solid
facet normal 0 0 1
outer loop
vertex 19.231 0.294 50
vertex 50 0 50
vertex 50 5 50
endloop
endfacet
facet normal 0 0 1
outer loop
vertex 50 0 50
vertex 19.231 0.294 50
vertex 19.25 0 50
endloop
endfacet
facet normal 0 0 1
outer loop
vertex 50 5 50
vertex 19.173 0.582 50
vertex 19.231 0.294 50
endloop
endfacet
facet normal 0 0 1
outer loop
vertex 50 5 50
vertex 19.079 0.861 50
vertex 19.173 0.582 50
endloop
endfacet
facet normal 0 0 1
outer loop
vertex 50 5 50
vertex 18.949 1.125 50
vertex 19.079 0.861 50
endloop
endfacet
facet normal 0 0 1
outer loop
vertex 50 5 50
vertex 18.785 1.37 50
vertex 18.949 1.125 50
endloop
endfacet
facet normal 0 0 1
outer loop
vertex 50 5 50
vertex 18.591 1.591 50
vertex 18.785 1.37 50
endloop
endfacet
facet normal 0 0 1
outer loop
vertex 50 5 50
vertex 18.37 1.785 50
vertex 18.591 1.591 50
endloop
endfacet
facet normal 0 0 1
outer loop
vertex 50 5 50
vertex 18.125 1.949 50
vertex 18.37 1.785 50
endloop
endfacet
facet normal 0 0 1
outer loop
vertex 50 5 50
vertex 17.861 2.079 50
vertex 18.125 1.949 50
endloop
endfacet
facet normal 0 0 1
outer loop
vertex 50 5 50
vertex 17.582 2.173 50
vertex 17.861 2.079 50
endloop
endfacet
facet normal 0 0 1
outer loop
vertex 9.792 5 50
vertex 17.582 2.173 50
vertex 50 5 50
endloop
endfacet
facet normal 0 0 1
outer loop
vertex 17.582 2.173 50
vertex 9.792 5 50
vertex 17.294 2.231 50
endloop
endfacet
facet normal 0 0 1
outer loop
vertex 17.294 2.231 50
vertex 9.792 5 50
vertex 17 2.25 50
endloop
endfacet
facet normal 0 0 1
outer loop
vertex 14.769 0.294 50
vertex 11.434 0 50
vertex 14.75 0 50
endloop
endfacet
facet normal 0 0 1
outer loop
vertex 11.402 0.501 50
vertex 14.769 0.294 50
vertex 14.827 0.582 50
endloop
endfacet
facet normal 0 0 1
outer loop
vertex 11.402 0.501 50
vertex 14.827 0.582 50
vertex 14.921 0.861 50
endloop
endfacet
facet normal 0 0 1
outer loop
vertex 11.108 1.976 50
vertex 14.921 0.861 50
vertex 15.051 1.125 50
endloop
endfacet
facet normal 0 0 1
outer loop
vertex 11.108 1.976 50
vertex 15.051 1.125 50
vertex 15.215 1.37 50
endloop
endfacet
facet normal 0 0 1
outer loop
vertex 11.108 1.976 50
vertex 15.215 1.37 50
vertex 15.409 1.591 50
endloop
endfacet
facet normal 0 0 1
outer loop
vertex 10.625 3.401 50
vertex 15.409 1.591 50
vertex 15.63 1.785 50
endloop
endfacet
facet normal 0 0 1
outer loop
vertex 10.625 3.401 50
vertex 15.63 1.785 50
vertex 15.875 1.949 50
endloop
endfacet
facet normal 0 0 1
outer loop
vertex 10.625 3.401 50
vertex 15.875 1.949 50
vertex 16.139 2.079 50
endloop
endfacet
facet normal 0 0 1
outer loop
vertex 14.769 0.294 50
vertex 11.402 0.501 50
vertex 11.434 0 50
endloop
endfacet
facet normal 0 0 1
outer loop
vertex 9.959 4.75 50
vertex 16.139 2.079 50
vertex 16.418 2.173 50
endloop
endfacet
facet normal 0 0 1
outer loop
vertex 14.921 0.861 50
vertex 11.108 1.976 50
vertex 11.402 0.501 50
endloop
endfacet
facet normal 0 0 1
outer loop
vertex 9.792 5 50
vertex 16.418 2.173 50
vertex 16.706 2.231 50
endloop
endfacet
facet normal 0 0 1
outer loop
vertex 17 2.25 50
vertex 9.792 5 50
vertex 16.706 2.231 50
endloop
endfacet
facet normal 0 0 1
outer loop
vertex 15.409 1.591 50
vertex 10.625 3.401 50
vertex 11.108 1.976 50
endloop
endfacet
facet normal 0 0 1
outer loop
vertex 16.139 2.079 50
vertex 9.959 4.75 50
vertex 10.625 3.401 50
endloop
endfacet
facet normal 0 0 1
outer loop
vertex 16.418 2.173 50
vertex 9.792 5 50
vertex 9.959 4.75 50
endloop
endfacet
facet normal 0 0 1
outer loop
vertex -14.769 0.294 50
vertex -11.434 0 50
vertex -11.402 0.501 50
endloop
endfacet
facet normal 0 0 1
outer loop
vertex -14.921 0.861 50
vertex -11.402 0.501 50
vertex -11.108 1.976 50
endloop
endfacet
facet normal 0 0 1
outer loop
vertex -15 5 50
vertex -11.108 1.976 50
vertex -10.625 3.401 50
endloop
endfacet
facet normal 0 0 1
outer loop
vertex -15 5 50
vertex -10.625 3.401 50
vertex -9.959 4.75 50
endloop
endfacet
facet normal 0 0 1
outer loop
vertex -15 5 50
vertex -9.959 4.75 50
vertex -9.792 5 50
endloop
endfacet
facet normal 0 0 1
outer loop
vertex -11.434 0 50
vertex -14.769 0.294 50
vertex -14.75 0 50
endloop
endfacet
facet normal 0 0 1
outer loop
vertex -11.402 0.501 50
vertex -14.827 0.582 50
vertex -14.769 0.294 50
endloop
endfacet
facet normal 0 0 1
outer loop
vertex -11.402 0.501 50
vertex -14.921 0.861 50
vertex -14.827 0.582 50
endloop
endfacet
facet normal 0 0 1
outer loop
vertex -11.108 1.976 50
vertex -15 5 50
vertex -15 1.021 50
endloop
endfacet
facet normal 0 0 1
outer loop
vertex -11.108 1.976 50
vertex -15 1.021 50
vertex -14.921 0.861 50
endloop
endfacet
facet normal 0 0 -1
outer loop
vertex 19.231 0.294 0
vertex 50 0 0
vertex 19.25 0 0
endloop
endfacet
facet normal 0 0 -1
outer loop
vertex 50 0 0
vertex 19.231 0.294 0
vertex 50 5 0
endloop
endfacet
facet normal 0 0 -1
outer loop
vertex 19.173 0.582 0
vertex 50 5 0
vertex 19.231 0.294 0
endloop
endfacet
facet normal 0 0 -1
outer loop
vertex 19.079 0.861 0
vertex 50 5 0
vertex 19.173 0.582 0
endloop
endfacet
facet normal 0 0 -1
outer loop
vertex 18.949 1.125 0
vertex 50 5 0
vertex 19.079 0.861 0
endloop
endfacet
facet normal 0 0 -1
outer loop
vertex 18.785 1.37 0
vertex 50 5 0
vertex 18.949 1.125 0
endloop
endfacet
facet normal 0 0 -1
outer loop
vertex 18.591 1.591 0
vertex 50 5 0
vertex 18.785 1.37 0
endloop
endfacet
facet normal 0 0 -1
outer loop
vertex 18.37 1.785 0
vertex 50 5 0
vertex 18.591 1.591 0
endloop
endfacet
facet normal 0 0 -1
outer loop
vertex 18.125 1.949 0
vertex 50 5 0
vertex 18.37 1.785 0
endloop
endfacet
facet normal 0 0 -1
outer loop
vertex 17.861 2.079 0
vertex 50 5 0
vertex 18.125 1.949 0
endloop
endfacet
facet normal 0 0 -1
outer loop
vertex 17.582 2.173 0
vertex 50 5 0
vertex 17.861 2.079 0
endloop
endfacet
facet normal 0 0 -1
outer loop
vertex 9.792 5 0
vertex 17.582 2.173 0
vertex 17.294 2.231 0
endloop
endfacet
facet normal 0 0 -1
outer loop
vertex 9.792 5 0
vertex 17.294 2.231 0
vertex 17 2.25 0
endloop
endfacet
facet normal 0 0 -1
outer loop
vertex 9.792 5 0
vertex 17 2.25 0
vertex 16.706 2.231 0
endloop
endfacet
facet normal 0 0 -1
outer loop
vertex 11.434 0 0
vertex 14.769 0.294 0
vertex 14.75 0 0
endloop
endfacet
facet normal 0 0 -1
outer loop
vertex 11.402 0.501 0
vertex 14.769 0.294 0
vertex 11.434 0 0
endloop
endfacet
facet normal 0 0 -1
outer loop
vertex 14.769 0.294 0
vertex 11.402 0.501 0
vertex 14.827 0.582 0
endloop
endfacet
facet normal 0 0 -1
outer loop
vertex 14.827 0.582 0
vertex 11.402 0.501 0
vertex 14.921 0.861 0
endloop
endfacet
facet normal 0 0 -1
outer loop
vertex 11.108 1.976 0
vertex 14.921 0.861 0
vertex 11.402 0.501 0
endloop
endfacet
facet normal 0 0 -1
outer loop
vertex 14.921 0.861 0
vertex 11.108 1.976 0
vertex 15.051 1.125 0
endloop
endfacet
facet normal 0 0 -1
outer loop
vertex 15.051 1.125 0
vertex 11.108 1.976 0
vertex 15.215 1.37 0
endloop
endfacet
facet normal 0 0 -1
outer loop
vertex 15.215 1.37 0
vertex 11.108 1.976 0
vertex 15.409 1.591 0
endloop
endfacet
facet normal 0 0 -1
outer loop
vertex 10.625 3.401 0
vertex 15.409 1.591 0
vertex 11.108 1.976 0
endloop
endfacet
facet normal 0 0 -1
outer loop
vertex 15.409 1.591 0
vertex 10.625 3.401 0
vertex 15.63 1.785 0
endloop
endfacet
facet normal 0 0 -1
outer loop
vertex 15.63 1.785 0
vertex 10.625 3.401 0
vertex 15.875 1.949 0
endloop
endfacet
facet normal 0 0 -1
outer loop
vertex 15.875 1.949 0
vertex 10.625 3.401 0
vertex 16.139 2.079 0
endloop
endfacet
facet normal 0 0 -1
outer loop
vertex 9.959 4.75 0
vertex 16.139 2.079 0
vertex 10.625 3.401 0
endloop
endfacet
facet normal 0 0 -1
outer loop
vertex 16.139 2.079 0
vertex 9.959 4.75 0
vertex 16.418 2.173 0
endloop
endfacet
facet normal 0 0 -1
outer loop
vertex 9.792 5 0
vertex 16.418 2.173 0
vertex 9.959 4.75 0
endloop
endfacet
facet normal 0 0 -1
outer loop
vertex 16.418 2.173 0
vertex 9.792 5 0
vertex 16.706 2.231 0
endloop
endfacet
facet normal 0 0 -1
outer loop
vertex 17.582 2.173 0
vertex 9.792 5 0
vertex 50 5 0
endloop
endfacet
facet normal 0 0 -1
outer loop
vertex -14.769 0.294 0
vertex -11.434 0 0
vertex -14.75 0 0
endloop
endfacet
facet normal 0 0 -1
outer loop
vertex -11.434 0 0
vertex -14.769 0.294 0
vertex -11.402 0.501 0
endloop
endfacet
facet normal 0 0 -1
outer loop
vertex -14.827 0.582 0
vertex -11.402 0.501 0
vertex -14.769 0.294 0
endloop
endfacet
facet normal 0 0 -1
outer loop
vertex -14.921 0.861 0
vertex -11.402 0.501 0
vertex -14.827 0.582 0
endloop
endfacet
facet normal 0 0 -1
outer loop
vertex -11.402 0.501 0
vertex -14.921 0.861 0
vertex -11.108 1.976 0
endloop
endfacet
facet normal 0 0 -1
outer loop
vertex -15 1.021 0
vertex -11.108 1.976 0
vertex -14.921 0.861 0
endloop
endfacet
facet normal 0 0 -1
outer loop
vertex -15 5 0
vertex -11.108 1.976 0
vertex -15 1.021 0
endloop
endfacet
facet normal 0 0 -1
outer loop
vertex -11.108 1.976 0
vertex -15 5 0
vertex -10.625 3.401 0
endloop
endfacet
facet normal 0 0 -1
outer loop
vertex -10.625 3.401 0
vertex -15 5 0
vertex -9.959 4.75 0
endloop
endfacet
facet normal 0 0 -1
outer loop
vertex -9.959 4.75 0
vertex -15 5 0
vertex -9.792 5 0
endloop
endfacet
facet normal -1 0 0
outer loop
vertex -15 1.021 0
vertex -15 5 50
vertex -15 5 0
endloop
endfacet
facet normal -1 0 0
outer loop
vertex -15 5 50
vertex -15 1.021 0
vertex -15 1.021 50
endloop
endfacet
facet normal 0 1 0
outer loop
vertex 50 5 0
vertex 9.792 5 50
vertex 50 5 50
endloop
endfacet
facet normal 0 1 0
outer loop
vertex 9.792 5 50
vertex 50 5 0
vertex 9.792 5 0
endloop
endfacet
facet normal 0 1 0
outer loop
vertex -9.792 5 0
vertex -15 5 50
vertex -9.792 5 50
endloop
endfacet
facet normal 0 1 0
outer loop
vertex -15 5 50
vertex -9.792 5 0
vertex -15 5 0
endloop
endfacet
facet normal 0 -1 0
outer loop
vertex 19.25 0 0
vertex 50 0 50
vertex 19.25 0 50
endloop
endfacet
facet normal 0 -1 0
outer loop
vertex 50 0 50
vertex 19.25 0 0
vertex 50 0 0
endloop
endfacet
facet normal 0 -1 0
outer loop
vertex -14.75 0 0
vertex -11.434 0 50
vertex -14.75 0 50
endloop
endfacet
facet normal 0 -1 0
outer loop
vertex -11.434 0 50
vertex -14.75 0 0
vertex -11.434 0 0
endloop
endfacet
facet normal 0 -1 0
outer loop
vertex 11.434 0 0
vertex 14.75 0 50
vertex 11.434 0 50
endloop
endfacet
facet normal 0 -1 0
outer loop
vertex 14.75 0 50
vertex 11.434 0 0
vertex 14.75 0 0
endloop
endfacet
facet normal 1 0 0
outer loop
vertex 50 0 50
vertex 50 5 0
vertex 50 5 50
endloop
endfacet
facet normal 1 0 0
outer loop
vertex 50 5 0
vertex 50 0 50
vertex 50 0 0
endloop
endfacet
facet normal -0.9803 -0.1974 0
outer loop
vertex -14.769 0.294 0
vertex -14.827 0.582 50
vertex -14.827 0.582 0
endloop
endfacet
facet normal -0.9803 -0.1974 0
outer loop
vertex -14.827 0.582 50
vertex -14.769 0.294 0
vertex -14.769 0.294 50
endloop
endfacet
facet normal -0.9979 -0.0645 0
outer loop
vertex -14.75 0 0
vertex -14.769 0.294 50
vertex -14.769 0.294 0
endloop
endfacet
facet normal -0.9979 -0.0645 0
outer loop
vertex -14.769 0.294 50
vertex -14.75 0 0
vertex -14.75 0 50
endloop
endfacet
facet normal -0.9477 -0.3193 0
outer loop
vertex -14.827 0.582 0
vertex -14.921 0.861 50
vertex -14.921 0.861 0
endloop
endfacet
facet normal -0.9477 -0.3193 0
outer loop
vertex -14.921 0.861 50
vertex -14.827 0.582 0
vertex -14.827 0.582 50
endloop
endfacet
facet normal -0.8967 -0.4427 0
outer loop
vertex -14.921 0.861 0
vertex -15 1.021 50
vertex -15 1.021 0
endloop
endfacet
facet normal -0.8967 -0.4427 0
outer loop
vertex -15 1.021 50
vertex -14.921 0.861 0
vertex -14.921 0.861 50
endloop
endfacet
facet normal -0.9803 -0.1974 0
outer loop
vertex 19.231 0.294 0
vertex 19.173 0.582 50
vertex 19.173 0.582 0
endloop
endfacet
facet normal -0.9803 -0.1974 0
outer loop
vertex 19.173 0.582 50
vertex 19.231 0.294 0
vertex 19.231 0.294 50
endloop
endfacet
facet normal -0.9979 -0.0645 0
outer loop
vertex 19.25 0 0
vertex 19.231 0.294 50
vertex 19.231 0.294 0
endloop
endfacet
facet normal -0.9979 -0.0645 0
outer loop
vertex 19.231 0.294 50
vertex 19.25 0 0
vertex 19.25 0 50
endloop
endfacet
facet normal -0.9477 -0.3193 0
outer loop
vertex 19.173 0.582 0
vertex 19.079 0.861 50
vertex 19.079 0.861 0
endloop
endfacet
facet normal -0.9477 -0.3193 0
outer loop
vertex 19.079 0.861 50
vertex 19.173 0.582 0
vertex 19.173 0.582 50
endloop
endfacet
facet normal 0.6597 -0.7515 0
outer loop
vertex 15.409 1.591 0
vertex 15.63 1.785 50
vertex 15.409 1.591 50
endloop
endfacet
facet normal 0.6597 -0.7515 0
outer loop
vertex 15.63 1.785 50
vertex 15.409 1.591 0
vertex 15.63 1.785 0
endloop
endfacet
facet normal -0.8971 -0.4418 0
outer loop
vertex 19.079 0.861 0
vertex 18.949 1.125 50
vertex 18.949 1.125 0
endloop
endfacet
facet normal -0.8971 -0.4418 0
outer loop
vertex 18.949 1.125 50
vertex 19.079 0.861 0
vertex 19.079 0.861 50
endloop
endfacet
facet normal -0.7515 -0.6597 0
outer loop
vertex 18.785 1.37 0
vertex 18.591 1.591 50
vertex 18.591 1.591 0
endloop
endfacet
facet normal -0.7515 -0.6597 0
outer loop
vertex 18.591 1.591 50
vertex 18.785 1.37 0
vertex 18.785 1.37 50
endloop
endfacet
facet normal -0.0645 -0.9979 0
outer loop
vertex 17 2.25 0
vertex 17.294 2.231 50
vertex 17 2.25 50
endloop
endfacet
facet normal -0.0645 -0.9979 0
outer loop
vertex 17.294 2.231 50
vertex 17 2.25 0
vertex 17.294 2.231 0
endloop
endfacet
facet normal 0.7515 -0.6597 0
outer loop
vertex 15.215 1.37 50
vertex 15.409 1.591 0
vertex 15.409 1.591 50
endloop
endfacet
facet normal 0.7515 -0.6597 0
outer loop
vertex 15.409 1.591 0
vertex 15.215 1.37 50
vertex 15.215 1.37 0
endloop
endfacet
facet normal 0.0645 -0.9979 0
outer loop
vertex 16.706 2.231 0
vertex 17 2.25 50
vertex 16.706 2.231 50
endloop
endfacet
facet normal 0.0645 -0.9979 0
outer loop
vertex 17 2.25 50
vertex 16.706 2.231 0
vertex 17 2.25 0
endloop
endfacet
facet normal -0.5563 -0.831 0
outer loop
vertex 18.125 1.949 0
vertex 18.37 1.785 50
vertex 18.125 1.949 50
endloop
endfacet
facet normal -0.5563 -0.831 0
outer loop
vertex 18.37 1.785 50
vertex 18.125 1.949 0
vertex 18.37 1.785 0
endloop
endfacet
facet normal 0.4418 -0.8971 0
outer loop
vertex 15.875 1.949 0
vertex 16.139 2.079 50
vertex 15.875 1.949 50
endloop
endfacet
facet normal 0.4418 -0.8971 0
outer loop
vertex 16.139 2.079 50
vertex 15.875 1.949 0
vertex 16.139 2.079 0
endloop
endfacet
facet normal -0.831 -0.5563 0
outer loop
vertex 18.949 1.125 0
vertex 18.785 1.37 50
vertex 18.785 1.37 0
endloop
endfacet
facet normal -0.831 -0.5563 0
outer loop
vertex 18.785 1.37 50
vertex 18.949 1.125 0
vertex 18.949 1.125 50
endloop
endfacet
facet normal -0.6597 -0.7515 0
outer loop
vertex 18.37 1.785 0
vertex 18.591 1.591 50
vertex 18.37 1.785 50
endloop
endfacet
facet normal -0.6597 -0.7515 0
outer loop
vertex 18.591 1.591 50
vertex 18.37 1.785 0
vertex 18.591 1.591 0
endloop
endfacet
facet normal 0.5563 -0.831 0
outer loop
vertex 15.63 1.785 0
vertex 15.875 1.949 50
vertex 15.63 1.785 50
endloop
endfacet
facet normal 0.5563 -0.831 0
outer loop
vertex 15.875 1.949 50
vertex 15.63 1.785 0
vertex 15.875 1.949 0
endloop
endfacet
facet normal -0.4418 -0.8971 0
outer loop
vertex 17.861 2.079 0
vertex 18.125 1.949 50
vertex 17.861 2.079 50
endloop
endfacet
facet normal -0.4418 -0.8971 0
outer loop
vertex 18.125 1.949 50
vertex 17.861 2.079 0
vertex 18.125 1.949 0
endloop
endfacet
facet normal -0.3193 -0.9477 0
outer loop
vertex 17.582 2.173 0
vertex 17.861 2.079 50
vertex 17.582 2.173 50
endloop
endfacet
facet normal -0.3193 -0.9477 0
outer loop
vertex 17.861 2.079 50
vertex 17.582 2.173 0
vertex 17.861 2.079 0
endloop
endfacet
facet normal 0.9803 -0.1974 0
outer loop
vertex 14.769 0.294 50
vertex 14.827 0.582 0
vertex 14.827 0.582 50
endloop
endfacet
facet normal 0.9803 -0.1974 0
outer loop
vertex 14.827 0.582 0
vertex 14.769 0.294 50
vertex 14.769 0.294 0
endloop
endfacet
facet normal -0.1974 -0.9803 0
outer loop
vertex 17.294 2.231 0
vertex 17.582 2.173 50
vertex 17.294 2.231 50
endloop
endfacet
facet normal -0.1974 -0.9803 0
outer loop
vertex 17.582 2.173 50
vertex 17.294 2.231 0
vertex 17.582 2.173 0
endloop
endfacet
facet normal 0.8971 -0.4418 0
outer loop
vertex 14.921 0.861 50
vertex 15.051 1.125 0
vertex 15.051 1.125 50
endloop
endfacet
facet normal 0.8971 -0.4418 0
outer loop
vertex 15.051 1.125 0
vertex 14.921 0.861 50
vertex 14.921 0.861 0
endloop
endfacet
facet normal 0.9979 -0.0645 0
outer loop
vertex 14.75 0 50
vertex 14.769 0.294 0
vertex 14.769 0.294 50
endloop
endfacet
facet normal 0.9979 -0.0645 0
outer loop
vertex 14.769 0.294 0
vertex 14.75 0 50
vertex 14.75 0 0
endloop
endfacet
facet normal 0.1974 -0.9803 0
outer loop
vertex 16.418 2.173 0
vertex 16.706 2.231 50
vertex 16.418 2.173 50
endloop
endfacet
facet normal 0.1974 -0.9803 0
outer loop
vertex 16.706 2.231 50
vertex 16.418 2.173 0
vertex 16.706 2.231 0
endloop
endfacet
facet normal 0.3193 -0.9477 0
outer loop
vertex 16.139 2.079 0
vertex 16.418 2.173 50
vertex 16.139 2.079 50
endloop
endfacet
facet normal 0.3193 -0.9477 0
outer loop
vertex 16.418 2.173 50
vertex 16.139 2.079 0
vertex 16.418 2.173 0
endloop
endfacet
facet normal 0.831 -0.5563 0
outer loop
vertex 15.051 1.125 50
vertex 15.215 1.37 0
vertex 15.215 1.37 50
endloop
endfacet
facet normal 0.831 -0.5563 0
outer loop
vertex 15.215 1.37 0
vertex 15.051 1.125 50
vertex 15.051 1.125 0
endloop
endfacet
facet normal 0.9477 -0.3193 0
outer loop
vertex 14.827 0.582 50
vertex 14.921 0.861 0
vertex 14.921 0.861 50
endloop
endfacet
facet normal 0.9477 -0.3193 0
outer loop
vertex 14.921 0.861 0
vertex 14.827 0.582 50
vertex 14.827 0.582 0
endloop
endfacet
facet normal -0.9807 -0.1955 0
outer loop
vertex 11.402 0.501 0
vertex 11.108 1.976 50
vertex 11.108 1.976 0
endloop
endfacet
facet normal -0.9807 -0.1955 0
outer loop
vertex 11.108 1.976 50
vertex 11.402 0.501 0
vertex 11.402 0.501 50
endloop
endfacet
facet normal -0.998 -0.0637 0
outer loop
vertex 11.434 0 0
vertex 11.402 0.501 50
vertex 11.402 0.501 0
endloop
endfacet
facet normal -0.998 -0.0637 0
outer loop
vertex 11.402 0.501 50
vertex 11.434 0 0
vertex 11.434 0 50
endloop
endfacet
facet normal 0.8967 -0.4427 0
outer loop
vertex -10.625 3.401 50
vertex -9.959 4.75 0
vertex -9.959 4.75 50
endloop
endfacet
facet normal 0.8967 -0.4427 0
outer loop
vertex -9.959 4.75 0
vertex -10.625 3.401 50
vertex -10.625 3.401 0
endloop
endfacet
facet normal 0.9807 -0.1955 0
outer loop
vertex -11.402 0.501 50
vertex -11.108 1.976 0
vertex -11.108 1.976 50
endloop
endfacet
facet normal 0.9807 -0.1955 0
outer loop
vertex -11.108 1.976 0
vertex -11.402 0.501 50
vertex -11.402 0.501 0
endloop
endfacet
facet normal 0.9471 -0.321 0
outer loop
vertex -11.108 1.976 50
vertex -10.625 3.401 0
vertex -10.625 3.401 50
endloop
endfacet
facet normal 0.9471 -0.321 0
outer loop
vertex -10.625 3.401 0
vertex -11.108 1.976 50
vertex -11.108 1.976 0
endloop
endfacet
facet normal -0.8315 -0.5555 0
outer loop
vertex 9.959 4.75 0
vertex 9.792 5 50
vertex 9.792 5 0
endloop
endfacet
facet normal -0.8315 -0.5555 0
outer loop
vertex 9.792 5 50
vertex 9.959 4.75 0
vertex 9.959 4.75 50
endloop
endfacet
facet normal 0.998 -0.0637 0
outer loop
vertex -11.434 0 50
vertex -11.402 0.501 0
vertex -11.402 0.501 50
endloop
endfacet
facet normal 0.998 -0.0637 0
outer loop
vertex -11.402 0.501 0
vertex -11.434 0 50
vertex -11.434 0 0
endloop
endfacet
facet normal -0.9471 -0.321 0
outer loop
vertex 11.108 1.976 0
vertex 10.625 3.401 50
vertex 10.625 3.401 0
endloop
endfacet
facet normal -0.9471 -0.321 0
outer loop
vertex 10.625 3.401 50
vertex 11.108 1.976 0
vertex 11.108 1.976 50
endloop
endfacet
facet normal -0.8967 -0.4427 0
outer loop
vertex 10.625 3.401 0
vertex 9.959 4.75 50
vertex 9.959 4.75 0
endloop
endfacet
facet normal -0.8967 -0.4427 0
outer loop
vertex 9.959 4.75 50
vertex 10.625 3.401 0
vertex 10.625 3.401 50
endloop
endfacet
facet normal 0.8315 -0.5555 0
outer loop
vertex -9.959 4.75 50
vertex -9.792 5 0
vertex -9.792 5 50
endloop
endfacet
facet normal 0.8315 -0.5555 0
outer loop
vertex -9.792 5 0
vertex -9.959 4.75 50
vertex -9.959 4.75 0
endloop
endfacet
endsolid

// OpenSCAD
// L-shaped mounting bracket for a NEMA 17 stepper motor (e.g. a syringe pump). NOVEL part.
//

base_d  = 50;
base_t  = 5;
arm_h   = 50;
arm_t   = 5;
motor_h = 23;
screw  = 3.4;
gusset = 5;

$fn = 48;

g = min(screw, 2.5);

difference() {
    union() {
        cube([base_d, base_t, base_t]);                 // base plate (square, not rectangular)
        cube([base_d, arm_t, arm_h]);                   // vertical motor plate
        for (sx = [-1, 1])
            translate([sx * (base_d / 2 - 10), 0, 0]) cube([base_d / 2 - 10, base_t, arm_h]);    // gussets: 5 mm thick, right triangle in the YZ plane (legs 20 x 20)
    }
    translate([-17, 0, 0]) cylinder(h = arm_h + 1, d = 4.5);                     // M4 hole
    translate([17, 0, 0])  cylinder(h = arm_h + 1, d = 4.5);                     // M4 hole
    translate([0, -1, 0])   cylinder(h = arm_h + 1, d = motor_h);                 // motor boss hole
    for (p = [[-15.5, -15.5], [-15.5, 15.5], [15.5, -15.5], [15.5, 15.5]])
        translate(p) rotate([0, 90, 0]) cylinder(h = arm_h + 1, d = screw);       // M3 screw holes
}
